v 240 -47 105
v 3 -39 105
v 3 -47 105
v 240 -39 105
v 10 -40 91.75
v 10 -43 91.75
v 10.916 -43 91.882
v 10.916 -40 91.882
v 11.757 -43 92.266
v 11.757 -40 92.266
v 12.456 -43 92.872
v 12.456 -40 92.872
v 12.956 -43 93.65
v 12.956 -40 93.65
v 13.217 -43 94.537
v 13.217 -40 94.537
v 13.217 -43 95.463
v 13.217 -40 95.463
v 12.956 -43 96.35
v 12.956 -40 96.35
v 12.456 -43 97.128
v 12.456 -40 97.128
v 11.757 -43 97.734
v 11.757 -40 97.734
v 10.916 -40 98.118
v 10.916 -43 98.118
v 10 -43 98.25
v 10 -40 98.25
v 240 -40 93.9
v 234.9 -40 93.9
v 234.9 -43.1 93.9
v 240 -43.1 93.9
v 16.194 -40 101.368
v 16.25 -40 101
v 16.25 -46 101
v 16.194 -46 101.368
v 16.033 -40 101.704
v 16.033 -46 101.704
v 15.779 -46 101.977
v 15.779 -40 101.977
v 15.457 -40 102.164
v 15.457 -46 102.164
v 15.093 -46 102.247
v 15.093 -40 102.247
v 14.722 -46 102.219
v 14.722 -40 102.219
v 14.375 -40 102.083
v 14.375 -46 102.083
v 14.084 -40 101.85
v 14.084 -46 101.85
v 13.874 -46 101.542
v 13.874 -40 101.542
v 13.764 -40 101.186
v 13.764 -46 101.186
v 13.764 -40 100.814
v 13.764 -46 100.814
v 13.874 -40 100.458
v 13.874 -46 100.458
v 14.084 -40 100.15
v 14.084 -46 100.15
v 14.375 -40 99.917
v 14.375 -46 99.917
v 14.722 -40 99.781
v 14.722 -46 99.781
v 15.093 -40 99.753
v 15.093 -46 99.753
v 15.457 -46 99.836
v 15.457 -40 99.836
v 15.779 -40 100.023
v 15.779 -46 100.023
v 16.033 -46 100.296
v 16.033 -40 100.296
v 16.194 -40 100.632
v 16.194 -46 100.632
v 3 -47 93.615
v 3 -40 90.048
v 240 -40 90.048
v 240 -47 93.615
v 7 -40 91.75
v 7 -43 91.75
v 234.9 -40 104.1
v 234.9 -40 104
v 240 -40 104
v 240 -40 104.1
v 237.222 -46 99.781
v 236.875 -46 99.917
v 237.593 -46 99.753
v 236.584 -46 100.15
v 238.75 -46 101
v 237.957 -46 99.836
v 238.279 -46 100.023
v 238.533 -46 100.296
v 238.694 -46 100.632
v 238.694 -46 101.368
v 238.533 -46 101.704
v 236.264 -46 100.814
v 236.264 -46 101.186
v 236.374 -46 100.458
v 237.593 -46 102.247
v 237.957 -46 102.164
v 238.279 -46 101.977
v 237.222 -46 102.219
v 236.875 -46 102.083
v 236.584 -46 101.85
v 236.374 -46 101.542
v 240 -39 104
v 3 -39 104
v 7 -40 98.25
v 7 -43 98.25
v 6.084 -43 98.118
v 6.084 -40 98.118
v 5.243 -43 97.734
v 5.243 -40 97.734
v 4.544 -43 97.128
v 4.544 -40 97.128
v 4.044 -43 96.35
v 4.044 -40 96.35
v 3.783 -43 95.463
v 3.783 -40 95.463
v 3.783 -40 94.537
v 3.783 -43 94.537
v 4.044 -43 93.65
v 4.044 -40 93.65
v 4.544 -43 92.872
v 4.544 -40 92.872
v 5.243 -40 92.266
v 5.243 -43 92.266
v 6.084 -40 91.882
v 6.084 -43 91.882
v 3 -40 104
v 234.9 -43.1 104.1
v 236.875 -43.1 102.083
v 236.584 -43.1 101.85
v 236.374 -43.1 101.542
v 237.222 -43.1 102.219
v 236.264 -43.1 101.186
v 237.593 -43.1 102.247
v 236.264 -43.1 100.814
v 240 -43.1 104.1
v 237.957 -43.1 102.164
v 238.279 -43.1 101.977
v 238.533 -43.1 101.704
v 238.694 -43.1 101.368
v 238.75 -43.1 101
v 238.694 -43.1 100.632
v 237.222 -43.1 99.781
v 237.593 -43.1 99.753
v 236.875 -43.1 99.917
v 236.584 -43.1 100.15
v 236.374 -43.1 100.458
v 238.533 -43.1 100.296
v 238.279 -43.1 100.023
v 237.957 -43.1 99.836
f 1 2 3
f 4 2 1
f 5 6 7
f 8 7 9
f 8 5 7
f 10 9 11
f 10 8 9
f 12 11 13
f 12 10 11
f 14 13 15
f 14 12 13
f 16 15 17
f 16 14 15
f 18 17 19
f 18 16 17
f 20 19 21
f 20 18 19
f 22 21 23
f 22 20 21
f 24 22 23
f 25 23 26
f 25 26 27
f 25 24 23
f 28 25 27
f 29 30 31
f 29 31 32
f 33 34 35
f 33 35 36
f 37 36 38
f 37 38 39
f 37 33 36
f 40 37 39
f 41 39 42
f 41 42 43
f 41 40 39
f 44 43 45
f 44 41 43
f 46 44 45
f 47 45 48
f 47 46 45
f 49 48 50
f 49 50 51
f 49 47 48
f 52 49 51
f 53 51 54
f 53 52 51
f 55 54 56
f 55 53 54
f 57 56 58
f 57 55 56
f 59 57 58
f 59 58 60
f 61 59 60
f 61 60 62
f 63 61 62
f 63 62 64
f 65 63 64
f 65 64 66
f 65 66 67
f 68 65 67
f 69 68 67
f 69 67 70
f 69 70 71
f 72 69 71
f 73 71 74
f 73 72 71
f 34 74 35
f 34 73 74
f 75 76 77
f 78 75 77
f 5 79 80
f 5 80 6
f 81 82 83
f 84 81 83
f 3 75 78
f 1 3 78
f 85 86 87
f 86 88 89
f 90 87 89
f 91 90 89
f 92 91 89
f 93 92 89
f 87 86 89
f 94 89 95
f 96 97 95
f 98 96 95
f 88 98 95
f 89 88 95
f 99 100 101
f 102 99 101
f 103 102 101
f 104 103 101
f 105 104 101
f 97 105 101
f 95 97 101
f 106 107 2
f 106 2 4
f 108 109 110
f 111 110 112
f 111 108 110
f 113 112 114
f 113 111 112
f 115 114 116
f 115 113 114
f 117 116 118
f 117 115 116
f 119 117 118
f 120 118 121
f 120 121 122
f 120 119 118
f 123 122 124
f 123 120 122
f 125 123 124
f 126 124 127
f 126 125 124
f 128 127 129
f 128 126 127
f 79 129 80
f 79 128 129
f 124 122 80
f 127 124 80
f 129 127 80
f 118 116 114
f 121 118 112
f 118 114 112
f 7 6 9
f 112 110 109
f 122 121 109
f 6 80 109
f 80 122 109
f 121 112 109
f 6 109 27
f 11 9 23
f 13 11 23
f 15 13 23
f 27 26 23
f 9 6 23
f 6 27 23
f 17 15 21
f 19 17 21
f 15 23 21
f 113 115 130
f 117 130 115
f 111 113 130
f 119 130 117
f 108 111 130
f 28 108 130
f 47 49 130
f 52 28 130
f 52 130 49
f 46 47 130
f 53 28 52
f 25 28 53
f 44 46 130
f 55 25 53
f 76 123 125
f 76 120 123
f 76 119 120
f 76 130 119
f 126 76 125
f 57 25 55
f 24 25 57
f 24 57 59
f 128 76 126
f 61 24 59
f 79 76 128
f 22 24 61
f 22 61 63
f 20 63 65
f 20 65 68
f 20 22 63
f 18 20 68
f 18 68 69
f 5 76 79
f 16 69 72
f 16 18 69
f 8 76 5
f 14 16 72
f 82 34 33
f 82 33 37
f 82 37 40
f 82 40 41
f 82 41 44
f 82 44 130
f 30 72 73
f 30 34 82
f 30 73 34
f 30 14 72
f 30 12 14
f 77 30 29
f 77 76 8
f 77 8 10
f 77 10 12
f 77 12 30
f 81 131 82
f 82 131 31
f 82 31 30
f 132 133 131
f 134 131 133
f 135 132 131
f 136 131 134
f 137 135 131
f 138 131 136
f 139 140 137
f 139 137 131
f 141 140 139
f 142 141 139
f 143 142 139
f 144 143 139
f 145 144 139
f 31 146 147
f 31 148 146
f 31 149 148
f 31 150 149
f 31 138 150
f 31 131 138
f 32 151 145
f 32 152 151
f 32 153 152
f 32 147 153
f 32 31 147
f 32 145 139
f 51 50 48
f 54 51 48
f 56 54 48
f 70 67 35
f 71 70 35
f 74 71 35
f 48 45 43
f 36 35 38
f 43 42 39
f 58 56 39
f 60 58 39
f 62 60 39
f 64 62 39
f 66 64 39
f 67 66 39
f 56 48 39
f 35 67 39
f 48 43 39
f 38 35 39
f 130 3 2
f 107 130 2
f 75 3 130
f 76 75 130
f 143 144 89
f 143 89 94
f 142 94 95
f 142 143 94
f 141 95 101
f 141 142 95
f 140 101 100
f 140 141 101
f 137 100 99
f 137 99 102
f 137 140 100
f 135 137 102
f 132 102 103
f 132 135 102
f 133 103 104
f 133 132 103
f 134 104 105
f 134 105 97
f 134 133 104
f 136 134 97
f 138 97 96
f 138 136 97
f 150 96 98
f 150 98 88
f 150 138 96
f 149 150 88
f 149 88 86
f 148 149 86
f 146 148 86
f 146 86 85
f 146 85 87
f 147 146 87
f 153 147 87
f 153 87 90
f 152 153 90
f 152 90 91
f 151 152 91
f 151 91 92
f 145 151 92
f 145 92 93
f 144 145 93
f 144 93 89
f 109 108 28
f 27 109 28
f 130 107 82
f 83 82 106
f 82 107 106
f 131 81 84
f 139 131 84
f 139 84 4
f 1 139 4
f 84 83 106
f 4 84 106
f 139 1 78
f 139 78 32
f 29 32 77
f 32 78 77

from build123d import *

# Parameters (mm, degrees)
BOX079_W               = 3
BOX079_H               = 10
BOX079_DEPTH           = 6.5
CYLINDER078_R          = 3.25
CYLINDER078_DEPTH      = 10
CYLINDER078_ROLL_ANGLE = 90
CYLINDER077_R          = 1.25
CYLINDER077_DEPTH      = 6
CYLINDER077_ROLL_ANGLE = 90
CYLINDER075_R          = 1.25
CYLINDER075_DEPTH      = 6
CYLINDER075_ROLL_ANGLE = 90
BOX078_W               = 5.1
BOX078_H               = 3.1
BOX078_DEPTH           = 10.2
CYLINDER073_R          = 3.25
CYLINDER073_DEPTH      = 10
CYLINDER073_ROLL_ANGLE = 90
BOX076_W               = 238
BOX076_H               = 8
BOX076_DEPTH           = 15
BOX074_W               = 37
BOX074_H               = 160
BOX074_DEPTH           = 120
BOX074_PITCH_ANGLE     = -15
BOX068_W               = 475
BOX068_H               = 10
BOX068_DEPTH           = 10
BOX068_ROLL_ANGLE      = -27
BOX049_W               = 475
BOX049_H               = 8
BOX049_DEPTH           = 15
BOX069_W               = 475
BOX069_H               = 8
BOX069_DEPTH           = 15


with BuildPart() as cube051:
    # Box079 → Box079 (new body)
    with BuildSketch(Plane(origin=(7, -43, 91.75), x_dir=(1, 0, 0), z_dir=(0, 0, 1))):
        with Locations((1.5, 5)):
            Rectangle(BOX079_W, BOX079_H)
    extrude(amount=BOX079_DEPTH)


with BuildPart() as fusion088:
    # Cylinder078 → Cylinder078 (new body)
    with BuildSketch(Plane.XY):
        Circle(CYLINDER078_R)
    extrude(amount=CYLINDER078_DEPTH)


with BuildPart() as fusion088_1:
    # Cylinder078 roll: moved
    add(fusion088.part.rotate(Axis((0, 0, 0), (1, 0, 0)), CYLINDER078_ROLL_ANGLE))


with BuildPart() as fusion088_2:
    # Cylinder078 placement: moved
    add(fusion088_1.part.moved(Location((10, -33, 95))))

    # Fusion088: union Cube051
    add(cube051.part)


with BuildPart() as cylinder077:
    # Cylinder077 → Cylinder077 (new body)
    with BuildSketch(Plane.XY):
        Circle(CYLINDER077_R)
    extrude(amount=CYLINDER077_DEPTH)


with BuildPart() as cylinder077_1:
    # Cylinder077 roll: moved
    add(cylinder077.part.rotate(Axis((0, 0, 0), (1, 0, 0)), CYLINDER077_ROLL_ANGLE))


with BuildPart() as cylinder077_2:
    # Cylinder077 placement: moved
    add(cylinder077_1.part.moved(Location((237.5, -40, 101))))


with BuildPart() as fusion084:
    # Cylinder075 → Cylinder075 (new body)
    with BuildSketch(Plane.XY):
        Circle(CYLINDER075_R)
    extrude(amount=CYLINDER075_DEPTH)


with BuildPart() as fusion084_1:
    # Cylinder075 roll: moved
    add(fusion084.part.rotate(Axis((0, 0, 0), (1, 0, 0)), CYLINDER075_ROLL_ANGLE))


with BuildPart() as fusion084_2:
    # Cylinder075 placement: moved
    add(fusion084_1.part.moved(Location((15, -40, 101))))

    # Fusion084: union Cylinder077
    add(cylinder077_2.part)


with BuildPart() as cube050:
    # Box078 → Box078 (new body)
    with BuildSketch(Plane(origin=(234.9, -43.1, 93.9), x_dir=(1, 0, 0), z_dir=(0, 0, 1))):
        with Locations((2.55, 1.55)):
            Rectangle(BOX078_W, BOX078_H)
    extrude(amount=BOX078_DEPTH)


with BuildPart() as cylinder073:
    # Cylinder073 → Cylinder073 (new body)
    with BuildSketch(Plane.XY):
        Circle(CYLINDER073_R)
    extrude(amount=CYLINDER073_DEPTH)


with BuildPart() as cylinder073_1:
    # Cylinder073 roll: moved
    add(cylinder073.part.rotate(Axis((0, 0, 0), (1, 0, 0)), CYLINDER073_ROLL_ANGLE))


with BuildPart() as cylinder073_2:
    # Cylinder073 placement: moved
    add(cylinder073_1.part.moved(Location((7, -33, 95))))


with BuildPart() as cube048:
    # Box076 → Box076 (new body)
    with BuildSketch(Plane(origin=(240, -47, 90), x_dir=(1, 0, 0), z_dir=(0, 0, 1))):
        with Locations((119, 4)):
            Rectangle(BOX076_W, BOX076_H)
    extrude(amount=BOX076_DEPTH)


with BuildPart() as cube046:
    # Box074 → Box074 (new body)
    with BuildSketch(Plane.XY):
        with Locations((18.5, 80)):
            Rectangle(BOX074_W, BOX074_H)
    extrude(amount=BOX074_DEPTH)


with BuildPart() as cube046_1:
    # Box074 pitch: moved
    add(cube046.part.rotate(Axis((0, 0, 0), (0, 1, 0)), BOX074_PITCH_ANGLE))


with BuildPart() as cube046_2:
    # Box074 placement: moved
    add(cube046_1.part.moved(Location((502.2, -50, -4))))


with BuildPart() as cube040:
    # Box068 → Box068 (new body)
    with BuildSketch(Plane.XY):
        with Locations((237.5, 5)):
            Rectangle(BOX068_W, BOX068_H)
    extrude(amount=BOX068_DEPTH)


with BuildPart() as cube040_1:
    # Box068 roll: moved
    add(cube040.part.rotate(Axis((0, 0, 0), (1, 0, 0)), BOX068_ROLL_ANGLE))


with BuildPart() as cube040_2:
    # Box068 placement: moved
    add(cube040_1.part.moved(Location((0, -53.1, 85.5))))


with BuildPart() as cube021:
    # Box049 → Box049 (new body)
    with BuildSketch(Plane(origin=(0, -40, 89), x_dir=(1, 0, 0), z_dir=(0, 0, 1))):
        with Locations((237.5, 4)):
            Rectangle(BOX049_W, BOX049_H)
    extrude(amount=BOX049_DEPTH)


with BuildPart() as cut095:
    # Box069 → Box069 (new body)
    with BuildSketch(Plane(origin=(0, -47, 90), x_dir=(1, 0, 0), z_dir=(0, 0, 1))):
        with Locations((237.5, 4)):
            Rectangle(BOX069_W, BOX069_H)
    extrude(amount=BOX069_DEPTH)

    # Cut066: cut Cube021
    add(cube021.part, mode=Mode.SUBTRACT)

    # Cut082: cut Cube040
    add(cube040_2.part, mode=Mode.SUBTRACT)


with BuildPart() as cut095_1:
    # Cut082 placement: moved
    add(cut095.part.moved(Location((3, 0, 0))))

    # Cut081: cut Cube046
    add(cube046_2.part, mode=Mode.SUBTRACT)

    # Cut084: cut Cube048
    add(cube048.part, mode=Mode.SUBTRACT)

    # Cut085: cut Cylinder073
    add(cylinder073_2.part, mode=Mode.SUBTRACT)

    # Cut090: cut Cube050
    add(cube050.part, mode=Mode.SUBTRACT)

    # Cut094: cut Fusion084
    add(fusion084_2.part, mode=Mode.SUBTRACT)

    # Cut095: cut Fusion088
    add(fusion088_2.part, mode=Mode.SUBTRACT)


solid = cut095_1.part
